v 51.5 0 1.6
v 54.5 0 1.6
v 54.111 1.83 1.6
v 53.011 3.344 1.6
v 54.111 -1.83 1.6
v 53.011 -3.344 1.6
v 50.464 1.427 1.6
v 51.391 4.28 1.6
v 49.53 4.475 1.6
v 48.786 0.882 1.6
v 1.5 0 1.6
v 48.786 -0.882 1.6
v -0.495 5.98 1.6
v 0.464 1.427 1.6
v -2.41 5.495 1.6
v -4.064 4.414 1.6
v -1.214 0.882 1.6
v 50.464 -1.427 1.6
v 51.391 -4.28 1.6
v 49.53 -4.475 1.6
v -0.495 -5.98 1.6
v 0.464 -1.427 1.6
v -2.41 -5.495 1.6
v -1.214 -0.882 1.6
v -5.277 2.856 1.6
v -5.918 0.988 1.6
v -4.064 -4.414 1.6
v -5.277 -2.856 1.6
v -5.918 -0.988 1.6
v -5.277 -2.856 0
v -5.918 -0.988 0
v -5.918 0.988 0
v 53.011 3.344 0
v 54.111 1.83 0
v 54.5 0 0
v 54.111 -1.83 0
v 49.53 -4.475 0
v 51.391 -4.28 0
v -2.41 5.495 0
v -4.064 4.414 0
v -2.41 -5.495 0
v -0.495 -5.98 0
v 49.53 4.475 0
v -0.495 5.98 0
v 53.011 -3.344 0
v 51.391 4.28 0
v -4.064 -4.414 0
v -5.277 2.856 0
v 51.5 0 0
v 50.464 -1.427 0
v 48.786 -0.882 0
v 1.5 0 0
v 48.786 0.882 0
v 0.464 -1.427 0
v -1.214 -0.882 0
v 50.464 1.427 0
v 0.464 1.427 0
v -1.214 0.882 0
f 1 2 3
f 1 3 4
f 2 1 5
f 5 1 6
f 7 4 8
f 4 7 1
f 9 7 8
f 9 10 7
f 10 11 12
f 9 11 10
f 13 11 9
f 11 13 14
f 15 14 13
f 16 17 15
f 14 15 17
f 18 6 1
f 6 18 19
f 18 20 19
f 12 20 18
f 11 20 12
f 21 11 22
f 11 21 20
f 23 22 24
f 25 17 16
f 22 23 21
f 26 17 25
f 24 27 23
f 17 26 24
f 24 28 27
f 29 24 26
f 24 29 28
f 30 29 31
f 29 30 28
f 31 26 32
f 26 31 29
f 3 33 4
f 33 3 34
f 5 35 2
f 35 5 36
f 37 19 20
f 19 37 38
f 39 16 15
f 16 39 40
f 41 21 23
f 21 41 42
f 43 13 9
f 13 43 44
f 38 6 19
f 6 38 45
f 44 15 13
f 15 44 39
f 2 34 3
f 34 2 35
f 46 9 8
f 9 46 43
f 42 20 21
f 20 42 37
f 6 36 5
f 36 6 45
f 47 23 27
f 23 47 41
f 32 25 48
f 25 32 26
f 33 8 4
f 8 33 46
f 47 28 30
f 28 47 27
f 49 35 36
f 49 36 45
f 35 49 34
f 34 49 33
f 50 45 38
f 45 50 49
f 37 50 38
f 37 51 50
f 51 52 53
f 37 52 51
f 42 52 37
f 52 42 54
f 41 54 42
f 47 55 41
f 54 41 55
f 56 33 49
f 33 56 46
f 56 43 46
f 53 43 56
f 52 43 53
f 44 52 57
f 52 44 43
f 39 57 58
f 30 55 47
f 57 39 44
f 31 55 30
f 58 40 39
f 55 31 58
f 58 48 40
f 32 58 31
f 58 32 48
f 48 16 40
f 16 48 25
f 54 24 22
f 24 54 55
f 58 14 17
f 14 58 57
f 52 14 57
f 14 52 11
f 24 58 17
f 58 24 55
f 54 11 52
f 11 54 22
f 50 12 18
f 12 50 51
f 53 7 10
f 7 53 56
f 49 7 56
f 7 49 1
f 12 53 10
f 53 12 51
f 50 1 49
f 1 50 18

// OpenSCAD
// file: physical_dimensions.scad
//Physically bound settings.
printing_play = 0.2; //Horizontal error in 3D printing.
printing_overhang = 50; //Maximum overhang angle. 90 is perfect bridging. 0 is no overhang possible.

movement_play = 0.2; //Play to leave if stuff has to move past each other.

hexkey_radius = 2; //Radius of circumscribed circle around hex key.
hexkey_short_length = 30; //Length of short end.//TODO: How long is this?

ball_radius = 15; //Standard pinball size (7/6 inch).

m3_bolt_radius = 1.5;
m3_nut_radius = 5.5 / 2;
m3_nut_height = 2.4;

flipper_solenoid_width = 13;
flipper_solenoid_height = 15;
flipper_solenoid_length = 30;
flipper_solenoid_pin_radius = 2;
flipper_solenoid_pin_retracted = 8.5; //Length when retracted.
flipper_solenoid_pin_expansion = 10; //Additional length when expanded.
flipper_solenoid_pinhole_position = 2.5; //Distance from centre of hole to tip of pin.
flipper_solenoid_pinhole_radius = m3_bolt_radius;
flipper_solenoid_pingap_thickness = 1.6;
flipper_solenoid_pingap_depth = 7;
flipper_solenoid_screw_radius = m3_bolt_radius;
flipper_solenoid_screw1_position = 8; //Distance from front.
flipper_solenoid_screw2_position = 15 + flipper_solenoid_screw1_position;
flipper_solenoid_screw_depth = 4; //Unknown.

spring_end_thickness = 2; //How thick the attachment part of the spring is.
spring_radius = 4; //Radius of the coil of the spring.
// main file
include <physical_dimensions.scad>

//Preference settings.
grip_side_radius = flipper_solenoid_pin_retracted - flipper_solenoid_pinhole_position;
length = 50;

module flipper_solenoid_brace() {
	difference() {
		hull() {
			cylinder(r=grip_side_radius, h=flipper_solenoid_pingap_thickness);
			translate([length, 0, 0]) {
				cylinder(r=flipper_solenoid_pingap_depth - flipper_solenoid_pinhole_position, h=flipper_solenoid_pingap_thickness);
			}
		}
		cylinder(r=m3_bolt_radius, h=flipper_solenoid_pingap_thickness);
		translate([length, 0, 0]) {
			cylinder(r=m3_bolt_radius, h=flipper_solenoid_pingap_thickness);
		}
	}
}

//Debug.
flipper_solenoid_brace();
